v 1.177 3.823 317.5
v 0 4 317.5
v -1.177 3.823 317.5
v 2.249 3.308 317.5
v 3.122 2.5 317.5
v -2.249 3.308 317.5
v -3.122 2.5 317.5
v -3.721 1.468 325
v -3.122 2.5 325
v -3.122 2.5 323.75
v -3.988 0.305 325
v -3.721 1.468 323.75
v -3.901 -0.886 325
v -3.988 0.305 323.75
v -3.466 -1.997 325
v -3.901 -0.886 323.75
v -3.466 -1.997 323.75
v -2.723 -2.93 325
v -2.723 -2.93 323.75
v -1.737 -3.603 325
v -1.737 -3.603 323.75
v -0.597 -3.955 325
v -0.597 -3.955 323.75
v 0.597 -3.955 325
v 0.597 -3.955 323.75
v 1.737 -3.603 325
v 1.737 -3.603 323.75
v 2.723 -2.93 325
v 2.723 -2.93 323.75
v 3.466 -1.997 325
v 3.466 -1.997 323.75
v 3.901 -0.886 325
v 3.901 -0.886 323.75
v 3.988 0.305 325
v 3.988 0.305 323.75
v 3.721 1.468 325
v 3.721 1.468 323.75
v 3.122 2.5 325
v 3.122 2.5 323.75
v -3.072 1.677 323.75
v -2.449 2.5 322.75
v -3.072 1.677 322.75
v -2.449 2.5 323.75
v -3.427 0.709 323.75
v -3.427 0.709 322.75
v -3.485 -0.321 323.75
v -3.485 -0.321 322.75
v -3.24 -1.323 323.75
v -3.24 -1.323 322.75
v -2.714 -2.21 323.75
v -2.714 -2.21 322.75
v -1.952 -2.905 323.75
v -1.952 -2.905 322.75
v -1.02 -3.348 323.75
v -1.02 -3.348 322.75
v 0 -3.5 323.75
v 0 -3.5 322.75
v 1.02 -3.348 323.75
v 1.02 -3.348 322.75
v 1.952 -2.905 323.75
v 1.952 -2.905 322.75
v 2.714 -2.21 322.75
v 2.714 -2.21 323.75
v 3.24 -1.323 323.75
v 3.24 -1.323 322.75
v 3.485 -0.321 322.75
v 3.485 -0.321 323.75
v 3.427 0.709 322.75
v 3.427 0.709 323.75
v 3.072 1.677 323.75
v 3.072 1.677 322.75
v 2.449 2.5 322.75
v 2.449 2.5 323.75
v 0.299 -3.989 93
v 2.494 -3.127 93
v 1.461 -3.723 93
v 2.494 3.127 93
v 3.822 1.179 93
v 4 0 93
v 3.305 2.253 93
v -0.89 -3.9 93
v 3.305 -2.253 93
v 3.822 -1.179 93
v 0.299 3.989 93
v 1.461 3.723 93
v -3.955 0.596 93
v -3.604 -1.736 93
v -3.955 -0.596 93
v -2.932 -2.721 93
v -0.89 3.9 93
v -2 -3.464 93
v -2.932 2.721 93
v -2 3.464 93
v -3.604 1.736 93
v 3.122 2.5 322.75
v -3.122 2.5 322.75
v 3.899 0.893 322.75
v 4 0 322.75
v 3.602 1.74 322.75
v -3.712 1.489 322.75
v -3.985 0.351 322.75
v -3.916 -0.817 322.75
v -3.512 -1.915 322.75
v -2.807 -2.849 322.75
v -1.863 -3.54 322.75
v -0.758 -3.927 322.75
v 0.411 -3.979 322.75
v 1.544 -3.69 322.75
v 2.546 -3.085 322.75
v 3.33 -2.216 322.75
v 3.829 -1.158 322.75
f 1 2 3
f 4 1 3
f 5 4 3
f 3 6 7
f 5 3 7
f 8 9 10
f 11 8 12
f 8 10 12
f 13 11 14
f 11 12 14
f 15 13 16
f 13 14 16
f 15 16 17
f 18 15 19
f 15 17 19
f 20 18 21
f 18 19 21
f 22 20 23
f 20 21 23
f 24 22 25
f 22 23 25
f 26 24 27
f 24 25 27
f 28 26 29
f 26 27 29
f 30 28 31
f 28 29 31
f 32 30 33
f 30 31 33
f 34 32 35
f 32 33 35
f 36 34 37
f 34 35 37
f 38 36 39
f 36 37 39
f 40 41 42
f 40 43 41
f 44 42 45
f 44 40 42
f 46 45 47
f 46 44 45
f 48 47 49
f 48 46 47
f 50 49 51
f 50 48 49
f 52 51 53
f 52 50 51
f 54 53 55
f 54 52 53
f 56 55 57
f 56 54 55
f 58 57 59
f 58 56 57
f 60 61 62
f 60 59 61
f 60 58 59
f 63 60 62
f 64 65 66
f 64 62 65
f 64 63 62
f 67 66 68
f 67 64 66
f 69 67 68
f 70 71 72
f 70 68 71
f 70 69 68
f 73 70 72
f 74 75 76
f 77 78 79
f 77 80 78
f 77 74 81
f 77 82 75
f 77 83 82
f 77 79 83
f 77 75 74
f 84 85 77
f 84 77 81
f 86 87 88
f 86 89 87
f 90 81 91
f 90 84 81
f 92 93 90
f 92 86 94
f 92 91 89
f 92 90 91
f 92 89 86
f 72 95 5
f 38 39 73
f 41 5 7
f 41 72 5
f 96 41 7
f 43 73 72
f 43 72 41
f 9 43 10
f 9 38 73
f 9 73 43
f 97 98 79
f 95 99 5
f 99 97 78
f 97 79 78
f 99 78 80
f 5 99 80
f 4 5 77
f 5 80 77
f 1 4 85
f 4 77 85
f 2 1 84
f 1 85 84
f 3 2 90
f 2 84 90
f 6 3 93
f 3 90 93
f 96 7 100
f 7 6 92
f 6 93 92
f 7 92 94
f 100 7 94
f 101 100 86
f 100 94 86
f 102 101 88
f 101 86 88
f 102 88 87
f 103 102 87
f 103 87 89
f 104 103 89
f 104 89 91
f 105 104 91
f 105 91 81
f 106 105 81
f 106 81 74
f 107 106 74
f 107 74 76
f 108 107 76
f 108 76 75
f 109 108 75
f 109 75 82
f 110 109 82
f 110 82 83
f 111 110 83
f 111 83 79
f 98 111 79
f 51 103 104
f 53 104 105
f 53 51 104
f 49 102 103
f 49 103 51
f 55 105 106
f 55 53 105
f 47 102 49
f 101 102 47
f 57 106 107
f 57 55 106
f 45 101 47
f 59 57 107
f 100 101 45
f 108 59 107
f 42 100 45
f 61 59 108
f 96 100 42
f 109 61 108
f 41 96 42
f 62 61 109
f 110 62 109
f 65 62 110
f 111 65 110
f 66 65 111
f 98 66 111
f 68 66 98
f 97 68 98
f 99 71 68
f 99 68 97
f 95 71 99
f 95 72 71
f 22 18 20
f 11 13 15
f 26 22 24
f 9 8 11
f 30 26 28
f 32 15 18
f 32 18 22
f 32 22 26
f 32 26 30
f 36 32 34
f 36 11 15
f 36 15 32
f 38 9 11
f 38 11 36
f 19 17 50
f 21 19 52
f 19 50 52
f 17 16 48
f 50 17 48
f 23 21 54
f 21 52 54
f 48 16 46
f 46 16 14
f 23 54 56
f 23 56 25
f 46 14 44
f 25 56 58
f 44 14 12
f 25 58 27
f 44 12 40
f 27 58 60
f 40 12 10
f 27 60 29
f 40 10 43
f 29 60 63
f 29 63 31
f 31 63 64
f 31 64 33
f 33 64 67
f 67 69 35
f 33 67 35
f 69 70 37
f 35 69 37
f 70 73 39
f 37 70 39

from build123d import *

# Parameters (mm, degrees)
SKETCH1_R           = 4
BOSS_EXTRUDE1_DEPTH = 325
CUT_EXTRUDE1_DEPTH  = 7.5
SKETCH3_R           = 4
SKETCH3_R_2         = 3.5
CUT_EXTRUDE2_DEPTH  = 1
SKETCH5_R           = 4
CUT_EXTRUDE3_DEPTH  = 65
SKETCH6_R           = 4
BOSS_EXTRUDE2_DEPTH = 13
SKETCH7_R           = 4
BOSS_EXTRUDE3_DEPTH = 10
SKETCH8_R           = 4
BOSS_EXTRUDE4_DEPTH = 40
SKETCH9_R           = 4
CUT_EXTRUDE4_DEPTH  = 30
SKETCH10_R          = 4
CUT_EXTRUDE5_DEPTH  = 61


with BuildPart() as part:
    # Sketch1 → Boss-Extrude1 (new body)
    with BuildSketch(Plane.XY):
        Circle(SKETCH1_R)
    extrude(amount=BOSS_EXTRUDE1_DEPTH)

    # Sketch2 → Cut-Extrude1 (cut)
    with BuildSketch(Plane.XY.offset(325)):
        with BuildLine():
            Line((3.122498999, 2.5), (-3.122498999, 2.5))
            ThreePointArc((-3.122498999, 2.5), (0, 4), (3.122498999, 2.5))
        make_face()
    extrude(amount=-CUT_EXTRUDE1_DEPTH, mode=Mode.SUBTRACT)

    # Sketch3 → Cut-Extrude2 (cut)
    with BuildSketch(Plane.XY.offset(323.75)):
        Circle(SKETCH3_R)
        Circle(SKETCH3_R_2, mode=Mode.SUBTRACT)
    extrude(amount=-CUT_EXTRUDE2_DEPTH, mode=Mode.SUBTRACT)

    # Sketch5 → Cut-Extrude3 (cut)
    with BuildSketch(Plane(origin=(0, 0, 0), x_dir=(-1, 0, 0), z_dir=(0, 0, -1))):
        Circle(SKETCH5_R)
    extrude(amount=-CUT_EXTRUDE3_DEPTH, mode=Mode.SUBTRACT)

    # Sketch6 → Boss-Extrude2 (add)
    with BuildSketch(Plane(origin=(0, 0, 65), x_dir=(-1, 0, 0), z_dir=(0, 0, -1))):
        Circle(SKETCH6_R)
    extrude(amount=BOSS_EXTRUDE2_DEPTH)

    # Sketch7 → Boss-Extrude3 (add)
    with BuildSketch(Plane(origin=(0, 0, 52), x_dir=(-1, 0, 0), z_dir=(0, 0, -1))):
        Circle(SKETCH7_R)
    extrude(amount=BOSS_EXTRUDE3_DEPTH)

    # Sketch8 → Boss-Extrude4 (add)
    with BuildSketch(Plane(origin=(0, 0, 42), x_dir=(-1, 0, 0), z_dir=(0, 0, -1))):
        Circle(SKETCH8_R)
    extrude(amount=BOSS_EXTRUDE4_DEPTH)

    # Sketch9 → Cut-Extrude4 (cut)
    with BuildSketch(Plane(origin=(0, 0, 2), x_dir=(-1, 0, 0), z_dir=(0, 0, -1))):
        Circle(SKETCH9_R)
    extrude(amount=-CUT_EXTRUDE4_DEPTH, mode=Mode.SUBTRACT)

    # Sketch10 → Cut-Extrude5 (cut)
    with BuildSketch(Plane(origin=(0, 0, 32), x_dir=(-1, 0, 0), z_dir=(0, 0, -1))):
        Circle(SKETCH10_R)
    extrude(amount=-CUT_EXTRUDE5_DEPTH, mode=Mode.SUBTRACT)


solid = part.part
